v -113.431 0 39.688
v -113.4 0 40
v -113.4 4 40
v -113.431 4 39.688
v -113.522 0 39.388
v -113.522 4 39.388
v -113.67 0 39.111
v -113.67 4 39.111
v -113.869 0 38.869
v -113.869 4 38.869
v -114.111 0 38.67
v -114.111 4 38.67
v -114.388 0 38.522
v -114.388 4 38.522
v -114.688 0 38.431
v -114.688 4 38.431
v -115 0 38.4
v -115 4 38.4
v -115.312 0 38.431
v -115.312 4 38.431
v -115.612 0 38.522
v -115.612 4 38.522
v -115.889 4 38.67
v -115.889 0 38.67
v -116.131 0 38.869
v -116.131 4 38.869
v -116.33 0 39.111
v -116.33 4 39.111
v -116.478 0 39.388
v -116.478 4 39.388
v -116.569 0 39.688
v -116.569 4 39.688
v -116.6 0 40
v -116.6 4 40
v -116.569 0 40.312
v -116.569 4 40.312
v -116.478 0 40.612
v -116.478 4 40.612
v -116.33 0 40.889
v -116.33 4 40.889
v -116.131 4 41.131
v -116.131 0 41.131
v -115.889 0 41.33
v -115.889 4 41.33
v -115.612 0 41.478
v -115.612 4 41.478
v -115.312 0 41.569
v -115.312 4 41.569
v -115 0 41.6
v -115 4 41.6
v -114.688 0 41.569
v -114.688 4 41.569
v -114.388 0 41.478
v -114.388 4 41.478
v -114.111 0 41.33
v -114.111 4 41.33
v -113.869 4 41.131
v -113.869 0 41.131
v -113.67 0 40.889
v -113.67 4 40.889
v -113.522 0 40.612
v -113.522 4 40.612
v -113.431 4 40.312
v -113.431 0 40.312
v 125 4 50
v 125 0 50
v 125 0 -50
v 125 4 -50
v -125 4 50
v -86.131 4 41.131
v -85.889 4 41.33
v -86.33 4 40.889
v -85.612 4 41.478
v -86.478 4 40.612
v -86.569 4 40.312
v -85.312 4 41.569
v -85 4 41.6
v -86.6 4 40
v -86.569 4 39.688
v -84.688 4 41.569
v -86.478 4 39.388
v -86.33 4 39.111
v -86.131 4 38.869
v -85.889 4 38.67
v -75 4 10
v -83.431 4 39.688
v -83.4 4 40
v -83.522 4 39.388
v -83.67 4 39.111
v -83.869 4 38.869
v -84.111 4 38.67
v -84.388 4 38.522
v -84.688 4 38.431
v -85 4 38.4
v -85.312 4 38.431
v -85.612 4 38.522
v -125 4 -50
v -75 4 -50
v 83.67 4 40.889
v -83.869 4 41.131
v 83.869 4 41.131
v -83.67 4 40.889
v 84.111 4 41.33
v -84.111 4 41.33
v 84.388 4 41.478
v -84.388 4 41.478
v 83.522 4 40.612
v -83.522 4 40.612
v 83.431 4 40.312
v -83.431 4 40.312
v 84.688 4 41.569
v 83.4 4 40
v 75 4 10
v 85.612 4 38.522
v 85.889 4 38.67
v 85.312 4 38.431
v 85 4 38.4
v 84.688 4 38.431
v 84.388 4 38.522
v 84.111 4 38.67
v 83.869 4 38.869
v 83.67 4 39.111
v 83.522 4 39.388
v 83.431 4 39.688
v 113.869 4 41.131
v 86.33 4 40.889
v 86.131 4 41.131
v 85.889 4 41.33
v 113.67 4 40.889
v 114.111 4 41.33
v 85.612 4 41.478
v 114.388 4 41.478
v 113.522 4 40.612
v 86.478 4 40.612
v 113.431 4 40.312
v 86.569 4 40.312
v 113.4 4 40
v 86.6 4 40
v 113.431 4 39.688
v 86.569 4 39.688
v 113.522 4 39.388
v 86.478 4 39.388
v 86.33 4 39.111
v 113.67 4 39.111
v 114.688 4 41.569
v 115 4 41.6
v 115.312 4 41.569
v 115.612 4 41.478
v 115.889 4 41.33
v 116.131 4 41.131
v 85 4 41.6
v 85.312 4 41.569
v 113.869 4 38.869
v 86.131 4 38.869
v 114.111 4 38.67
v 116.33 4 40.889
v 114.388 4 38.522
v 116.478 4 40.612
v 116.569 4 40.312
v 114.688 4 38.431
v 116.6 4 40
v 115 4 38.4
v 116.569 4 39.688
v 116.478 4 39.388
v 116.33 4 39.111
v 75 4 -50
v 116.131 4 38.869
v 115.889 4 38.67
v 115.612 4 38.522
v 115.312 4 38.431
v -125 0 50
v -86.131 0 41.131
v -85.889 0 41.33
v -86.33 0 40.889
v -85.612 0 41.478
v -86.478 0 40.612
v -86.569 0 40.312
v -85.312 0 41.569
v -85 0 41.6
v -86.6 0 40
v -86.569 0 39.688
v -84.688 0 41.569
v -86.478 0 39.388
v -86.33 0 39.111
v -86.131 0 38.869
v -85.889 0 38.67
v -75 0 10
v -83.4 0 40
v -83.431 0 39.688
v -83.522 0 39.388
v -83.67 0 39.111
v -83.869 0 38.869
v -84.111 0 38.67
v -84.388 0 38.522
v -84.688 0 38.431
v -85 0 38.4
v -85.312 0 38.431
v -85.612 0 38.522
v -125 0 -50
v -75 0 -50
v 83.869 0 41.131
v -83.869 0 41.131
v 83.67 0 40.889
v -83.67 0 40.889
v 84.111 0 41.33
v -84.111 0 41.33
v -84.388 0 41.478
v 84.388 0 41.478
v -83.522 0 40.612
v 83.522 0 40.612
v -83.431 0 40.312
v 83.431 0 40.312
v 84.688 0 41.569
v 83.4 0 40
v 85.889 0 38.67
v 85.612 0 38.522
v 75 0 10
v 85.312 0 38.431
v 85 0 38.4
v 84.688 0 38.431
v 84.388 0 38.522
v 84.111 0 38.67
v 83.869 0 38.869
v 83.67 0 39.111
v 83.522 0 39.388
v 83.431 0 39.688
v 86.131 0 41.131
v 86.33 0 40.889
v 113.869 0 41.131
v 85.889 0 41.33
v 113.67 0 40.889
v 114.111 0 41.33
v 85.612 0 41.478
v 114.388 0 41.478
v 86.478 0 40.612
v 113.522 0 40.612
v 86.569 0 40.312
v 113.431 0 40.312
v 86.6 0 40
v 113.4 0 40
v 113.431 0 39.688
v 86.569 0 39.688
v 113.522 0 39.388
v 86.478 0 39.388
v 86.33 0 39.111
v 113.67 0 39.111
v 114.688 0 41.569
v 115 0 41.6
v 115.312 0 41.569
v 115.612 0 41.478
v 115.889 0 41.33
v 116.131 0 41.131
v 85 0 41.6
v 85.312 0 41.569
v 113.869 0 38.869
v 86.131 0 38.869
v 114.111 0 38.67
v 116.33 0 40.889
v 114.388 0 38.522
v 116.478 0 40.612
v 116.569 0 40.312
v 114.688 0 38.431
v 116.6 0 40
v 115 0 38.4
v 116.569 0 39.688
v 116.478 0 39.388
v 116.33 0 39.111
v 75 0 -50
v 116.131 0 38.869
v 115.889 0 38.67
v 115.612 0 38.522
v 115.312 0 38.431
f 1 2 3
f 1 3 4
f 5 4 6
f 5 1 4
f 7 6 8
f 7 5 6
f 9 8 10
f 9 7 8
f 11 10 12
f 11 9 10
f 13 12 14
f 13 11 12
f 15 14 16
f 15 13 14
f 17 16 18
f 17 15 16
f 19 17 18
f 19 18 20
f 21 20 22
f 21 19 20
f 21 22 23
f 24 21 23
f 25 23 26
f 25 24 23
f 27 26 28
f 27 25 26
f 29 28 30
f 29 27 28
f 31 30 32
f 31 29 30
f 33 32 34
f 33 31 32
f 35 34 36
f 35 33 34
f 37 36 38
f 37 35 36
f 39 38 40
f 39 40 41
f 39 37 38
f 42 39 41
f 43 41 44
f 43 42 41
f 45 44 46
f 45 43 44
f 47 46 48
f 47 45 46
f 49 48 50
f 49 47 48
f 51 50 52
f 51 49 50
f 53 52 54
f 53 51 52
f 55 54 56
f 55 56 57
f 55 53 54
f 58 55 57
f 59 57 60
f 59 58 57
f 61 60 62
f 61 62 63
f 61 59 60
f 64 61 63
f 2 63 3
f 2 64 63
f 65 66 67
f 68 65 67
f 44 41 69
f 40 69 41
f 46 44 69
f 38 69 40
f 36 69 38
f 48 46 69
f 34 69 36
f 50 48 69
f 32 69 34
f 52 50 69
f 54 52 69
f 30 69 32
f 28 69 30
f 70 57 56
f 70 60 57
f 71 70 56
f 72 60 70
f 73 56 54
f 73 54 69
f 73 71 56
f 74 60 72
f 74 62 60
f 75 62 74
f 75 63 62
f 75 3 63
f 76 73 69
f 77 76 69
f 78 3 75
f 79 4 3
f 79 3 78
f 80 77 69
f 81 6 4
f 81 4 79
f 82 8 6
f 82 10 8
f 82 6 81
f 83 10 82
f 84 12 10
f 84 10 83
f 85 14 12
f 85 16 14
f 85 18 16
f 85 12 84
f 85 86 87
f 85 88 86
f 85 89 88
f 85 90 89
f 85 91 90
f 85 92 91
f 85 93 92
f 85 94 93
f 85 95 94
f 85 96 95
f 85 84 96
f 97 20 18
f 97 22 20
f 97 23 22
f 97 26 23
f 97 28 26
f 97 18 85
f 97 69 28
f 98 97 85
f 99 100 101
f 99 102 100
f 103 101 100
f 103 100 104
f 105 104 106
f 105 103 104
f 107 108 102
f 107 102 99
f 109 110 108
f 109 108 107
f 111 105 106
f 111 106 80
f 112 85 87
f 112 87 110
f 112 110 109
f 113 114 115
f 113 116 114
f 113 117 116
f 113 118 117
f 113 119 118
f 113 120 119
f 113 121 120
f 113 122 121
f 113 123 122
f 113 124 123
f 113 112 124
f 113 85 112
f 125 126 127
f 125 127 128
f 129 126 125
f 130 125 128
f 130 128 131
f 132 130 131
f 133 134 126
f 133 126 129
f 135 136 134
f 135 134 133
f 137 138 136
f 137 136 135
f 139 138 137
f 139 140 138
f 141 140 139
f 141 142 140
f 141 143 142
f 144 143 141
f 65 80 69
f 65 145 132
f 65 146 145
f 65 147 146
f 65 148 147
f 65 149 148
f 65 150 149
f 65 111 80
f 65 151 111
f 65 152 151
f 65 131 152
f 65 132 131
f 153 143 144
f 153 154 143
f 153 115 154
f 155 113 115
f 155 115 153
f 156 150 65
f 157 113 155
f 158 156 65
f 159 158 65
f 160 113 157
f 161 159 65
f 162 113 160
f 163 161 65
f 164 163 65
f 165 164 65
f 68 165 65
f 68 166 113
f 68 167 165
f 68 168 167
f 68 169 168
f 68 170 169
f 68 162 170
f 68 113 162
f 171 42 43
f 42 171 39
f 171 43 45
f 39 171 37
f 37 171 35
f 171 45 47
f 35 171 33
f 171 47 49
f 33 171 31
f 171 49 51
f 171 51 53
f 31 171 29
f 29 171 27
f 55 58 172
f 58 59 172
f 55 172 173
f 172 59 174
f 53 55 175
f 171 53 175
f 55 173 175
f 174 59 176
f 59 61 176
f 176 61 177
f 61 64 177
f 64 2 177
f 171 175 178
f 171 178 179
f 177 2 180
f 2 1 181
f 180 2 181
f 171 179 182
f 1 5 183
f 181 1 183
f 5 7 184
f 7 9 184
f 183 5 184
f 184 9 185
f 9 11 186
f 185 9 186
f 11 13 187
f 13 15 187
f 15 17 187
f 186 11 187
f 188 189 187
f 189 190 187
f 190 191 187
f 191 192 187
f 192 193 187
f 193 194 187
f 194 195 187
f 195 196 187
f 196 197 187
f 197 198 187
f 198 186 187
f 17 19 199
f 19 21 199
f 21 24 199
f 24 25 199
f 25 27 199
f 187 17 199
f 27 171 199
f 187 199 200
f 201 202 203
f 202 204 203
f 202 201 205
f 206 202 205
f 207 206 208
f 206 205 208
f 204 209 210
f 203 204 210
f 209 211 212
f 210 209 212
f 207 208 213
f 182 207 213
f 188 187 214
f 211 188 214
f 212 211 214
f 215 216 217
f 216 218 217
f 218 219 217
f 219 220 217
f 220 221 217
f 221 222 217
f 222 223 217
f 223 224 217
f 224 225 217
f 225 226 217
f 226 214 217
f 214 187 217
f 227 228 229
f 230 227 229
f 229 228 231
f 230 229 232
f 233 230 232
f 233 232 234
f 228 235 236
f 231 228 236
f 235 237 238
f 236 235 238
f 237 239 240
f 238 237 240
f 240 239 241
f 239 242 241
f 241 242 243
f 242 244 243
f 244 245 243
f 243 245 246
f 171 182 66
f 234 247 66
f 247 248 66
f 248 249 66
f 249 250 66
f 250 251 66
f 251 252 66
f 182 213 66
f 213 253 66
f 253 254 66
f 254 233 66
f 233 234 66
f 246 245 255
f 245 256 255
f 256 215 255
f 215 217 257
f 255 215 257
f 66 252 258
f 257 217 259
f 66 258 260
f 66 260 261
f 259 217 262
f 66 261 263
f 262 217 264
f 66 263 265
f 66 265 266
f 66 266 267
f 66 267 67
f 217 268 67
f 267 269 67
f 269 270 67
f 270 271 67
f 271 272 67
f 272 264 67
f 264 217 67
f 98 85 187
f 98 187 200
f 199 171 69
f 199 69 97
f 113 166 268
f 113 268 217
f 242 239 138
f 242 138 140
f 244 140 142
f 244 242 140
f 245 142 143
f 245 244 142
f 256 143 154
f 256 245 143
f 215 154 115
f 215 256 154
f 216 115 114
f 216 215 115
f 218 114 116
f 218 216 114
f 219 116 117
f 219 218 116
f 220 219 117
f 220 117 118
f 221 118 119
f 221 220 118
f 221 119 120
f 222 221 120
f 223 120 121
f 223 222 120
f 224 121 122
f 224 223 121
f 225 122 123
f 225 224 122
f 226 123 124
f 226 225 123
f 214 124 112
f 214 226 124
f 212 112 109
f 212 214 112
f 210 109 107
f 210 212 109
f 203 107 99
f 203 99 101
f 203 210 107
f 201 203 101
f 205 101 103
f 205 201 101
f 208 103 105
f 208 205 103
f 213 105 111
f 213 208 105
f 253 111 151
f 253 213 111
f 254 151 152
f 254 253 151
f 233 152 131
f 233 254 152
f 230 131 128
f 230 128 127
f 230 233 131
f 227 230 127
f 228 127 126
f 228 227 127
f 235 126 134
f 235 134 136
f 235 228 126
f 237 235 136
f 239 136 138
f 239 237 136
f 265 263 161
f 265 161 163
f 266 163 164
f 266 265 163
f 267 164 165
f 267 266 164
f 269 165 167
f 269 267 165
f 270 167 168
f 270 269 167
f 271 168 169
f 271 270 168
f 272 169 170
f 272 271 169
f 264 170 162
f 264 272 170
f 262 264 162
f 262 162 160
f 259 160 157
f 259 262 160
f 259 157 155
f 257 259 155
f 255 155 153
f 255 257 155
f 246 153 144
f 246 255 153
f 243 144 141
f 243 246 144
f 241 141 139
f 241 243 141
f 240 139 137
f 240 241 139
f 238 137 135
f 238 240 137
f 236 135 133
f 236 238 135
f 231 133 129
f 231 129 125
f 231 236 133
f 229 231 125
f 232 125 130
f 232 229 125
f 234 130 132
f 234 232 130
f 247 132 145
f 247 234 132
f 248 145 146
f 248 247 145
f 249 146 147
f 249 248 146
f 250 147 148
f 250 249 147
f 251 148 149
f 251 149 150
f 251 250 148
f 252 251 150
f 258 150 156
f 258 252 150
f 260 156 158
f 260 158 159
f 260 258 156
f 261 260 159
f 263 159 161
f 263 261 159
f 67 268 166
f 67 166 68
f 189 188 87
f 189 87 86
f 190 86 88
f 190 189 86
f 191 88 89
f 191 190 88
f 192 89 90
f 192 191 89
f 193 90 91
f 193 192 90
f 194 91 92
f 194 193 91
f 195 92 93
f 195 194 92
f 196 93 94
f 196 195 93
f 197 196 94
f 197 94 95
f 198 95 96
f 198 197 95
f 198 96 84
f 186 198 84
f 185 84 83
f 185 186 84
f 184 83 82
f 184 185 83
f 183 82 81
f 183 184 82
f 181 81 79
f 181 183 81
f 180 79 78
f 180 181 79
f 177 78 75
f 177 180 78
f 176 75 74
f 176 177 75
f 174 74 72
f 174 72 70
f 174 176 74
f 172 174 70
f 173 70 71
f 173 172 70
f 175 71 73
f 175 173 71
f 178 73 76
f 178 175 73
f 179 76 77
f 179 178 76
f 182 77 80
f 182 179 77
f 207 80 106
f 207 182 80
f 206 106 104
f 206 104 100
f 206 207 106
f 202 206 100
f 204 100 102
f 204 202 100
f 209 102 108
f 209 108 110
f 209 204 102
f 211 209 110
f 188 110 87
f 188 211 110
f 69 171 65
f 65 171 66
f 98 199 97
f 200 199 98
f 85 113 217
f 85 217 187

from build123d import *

# Parameters (mm, degrees)
SKETCH_1_W          = 250
SKETCH_1_H          = 100
SKETCH_1_R          = 1.6
EXTRUDE_1_DEPTH     = 4
CUT_EXTRUDE_1_DEPTH = 5


with BuildPart() as part:
    # 草图1 → 凸台-拉伸1 (new body)
    with BuildSketch(Plane(origin=(0, 0, 0), x_dir=(1, 0, 0), z_dir=(0, 1, 0))):
        Rectangle(SKETCH_1_W, SKETCH_1_H)
        with Locations((-115, -40)):
            Circle(SKETCH_1_R, mode=Mode.SUBTRACT)
        with Locations((-85, -40)):
            Circle(SKETCH_1_R, mode=Mode.SUBTRACT)
        with Locations((85, -40)):
            Circle(SKETCH_1_R, mode=Mode.SUBTRACT)
        with Locations((115, -40)):
            Circle(SKETCH_1_R, mode=Mode.SUBTRACT)
    extrude(amount=EXTRUDE_1_DEPTH)

    # 草图2 → 切除-拉伸1 (cut, through all)
    with BuildSketch(Plane(origin=(0, 4, 0), x_dir=(1, 0, 0), z_dir=(0, 1, 0))):
        Polygon((74.999994093, 50), (74.999998028, -10), (-74.999998028, -10), (-74.999994093, 50), align=None)
    extrude(amount=-CUT_EXTRUDE_1_DEPTH, mode=Mode.SUBTRACT)


solid = part.part
